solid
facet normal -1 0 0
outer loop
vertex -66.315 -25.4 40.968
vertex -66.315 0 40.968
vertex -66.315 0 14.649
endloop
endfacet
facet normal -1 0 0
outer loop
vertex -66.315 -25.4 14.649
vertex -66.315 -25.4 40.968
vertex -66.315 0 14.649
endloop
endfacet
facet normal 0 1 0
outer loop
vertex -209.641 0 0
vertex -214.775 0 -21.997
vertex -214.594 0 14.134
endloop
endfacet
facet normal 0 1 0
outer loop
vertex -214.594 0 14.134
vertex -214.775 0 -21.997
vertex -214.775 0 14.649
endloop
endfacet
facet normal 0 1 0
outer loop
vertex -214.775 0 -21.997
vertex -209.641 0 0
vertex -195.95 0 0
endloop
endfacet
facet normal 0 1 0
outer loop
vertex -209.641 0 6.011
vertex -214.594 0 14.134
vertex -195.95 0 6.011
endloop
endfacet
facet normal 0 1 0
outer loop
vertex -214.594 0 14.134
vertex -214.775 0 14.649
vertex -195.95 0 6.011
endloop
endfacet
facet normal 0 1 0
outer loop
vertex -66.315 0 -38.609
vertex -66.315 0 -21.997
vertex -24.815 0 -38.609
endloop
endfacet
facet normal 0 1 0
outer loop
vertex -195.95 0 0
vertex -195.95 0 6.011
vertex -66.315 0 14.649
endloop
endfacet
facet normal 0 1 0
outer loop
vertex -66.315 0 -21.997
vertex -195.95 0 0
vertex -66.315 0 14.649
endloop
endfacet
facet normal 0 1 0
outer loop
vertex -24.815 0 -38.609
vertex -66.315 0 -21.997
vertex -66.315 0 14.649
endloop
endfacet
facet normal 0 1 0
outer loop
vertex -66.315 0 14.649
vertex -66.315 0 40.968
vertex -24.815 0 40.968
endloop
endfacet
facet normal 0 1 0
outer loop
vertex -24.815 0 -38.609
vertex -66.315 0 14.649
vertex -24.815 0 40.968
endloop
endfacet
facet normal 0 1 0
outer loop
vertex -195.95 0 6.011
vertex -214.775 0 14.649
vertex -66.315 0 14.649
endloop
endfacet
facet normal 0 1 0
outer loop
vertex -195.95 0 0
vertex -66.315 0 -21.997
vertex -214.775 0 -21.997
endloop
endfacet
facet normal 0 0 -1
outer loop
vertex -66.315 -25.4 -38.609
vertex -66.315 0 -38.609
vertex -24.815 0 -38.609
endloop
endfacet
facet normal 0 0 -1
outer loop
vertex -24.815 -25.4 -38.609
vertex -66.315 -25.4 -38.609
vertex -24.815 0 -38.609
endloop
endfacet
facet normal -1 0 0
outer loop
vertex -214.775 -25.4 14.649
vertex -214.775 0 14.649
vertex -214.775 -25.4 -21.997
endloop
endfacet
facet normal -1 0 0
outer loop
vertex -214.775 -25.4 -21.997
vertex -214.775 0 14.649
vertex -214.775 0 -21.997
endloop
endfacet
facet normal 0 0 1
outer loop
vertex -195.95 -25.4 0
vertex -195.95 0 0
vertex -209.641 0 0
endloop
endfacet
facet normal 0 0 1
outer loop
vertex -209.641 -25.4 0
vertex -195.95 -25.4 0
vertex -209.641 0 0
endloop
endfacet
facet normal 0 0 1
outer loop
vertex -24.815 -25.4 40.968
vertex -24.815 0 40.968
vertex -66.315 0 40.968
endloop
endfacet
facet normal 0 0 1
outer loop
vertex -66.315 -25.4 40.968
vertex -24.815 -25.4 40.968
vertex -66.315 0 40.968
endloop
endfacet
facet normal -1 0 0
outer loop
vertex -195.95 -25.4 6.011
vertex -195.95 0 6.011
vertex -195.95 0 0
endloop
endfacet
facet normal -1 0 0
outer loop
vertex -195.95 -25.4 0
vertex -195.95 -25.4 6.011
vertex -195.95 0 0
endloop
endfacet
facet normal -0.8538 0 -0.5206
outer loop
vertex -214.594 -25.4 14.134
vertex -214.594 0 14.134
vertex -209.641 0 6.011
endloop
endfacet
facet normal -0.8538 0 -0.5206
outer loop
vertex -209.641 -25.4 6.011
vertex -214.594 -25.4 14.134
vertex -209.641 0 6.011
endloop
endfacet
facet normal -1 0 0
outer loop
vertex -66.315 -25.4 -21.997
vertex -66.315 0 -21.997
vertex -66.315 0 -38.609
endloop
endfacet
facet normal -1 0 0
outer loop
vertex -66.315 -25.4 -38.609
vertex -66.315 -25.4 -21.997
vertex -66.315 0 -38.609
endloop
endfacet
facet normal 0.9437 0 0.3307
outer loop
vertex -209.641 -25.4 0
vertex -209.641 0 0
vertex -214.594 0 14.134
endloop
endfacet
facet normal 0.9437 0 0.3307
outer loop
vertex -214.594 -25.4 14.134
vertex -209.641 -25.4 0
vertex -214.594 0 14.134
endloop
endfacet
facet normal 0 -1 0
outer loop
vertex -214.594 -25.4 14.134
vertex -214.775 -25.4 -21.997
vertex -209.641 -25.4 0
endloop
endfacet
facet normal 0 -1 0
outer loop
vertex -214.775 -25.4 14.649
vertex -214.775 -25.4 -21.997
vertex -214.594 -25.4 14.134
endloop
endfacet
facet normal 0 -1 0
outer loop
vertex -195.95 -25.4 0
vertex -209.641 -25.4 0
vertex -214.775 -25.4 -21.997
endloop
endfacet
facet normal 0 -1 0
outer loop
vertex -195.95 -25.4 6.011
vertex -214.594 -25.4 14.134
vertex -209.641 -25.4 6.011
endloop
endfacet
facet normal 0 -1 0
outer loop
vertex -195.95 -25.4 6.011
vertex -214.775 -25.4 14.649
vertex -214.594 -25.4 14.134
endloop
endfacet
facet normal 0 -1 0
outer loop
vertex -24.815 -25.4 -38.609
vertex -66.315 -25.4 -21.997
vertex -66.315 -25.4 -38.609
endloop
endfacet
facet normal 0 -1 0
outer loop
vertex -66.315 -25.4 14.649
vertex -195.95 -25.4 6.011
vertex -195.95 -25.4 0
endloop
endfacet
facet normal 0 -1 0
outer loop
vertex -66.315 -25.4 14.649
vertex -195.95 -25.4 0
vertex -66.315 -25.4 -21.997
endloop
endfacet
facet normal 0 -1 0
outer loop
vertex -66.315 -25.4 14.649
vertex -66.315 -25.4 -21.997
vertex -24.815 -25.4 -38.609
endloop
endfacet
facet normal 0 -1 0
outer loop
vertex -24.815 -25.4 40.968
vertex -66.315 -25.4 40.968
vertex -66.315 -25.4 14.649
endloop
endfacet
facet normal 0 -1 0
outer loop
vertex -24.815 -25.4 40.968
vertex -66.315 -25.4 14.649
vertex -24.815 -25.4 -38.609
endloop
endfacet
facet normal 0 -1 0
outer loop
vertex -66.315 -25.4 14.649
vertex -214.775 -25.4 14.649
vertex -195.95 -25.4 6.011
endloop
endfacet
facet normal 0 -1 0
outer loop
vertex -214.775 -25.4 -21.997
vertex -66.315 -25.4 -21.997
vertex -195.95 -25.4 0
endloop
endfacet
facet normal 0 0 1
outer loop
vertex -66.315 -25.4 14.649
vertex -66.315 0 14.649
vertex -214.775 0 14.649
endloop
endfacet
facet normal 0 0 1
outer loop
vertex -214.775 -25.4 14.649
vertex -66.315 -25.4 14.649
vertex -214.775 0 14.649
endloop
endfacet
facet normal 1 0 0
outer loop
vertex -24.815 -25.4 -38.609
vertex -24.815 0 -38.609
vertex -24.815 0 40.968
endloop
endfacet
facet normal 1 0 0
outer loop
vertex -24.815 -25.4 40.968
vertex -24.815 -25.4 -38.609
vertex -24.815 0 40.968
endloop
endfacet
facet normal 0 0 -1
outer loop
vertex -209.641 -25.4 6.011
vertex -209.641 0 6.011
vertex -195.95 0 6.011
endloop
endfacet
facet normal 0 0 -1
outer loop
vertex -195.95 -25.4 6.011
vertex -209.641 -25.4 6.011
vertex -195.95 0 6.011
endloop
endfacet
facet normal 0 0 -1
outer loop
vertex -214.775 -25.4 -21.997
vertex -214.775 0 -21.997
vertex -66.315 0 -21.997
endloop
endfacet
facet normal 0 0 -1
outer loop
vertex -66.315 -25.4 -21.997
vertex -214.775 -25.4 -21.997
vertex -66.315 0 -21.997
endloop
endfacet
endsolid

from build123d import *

# Parameters (mm, degrees)
F0_W     = 8.1289224327
F0_H     = 36.6465272382
F1_DEPTH = 25.4


with BuildPart() as f1:
    # F0 (on Front) → F1 (new body)
    with BuildSketch(Plane.XZ):
        Polygon((-24.8146168888, 40.9678071737), (-66.3149282336, 40.9678071737), (-66.3149282336, 14.6492579952), (-58.186005801, 14.6492579952), (-58.186005801, -21.997269243), (-66.3149282336, -21.997269243), (-66.3149282336, -38.6094748974), (-24.8146168888, -38.6094748974), align=None)
        with Locations((-62.2504670173, -3.6740056239)):
            Rectangle(F0_W, F0_H)
        Polygon((-66.3149282336, -21.997269243), (-66.3149282336, 14.6492579952), (-214.7748172283, 14.6492579952), (-214.5942430103, 14.1340185696), (-209.6407413483, 6.0107740574), (-195.9499269724, 6.0107740574), (-195.9499269724, 0), (-171.5631484985, -21.997269243), align=None)
        Polygon((-214.5942430103, 14.1340185696), (-214.7748172283, 14.6492579952), (-214.7748172283, 14.4301421254), align=None)
        Polygon((-214.7748172283, -21.997269243), (-171.5631484985, -21.997269243), (-195.9499269724, 0), (-209.6407413483, 0), (-214.5942430103, 14.1340185696), (-214.7748172283, 14.4301421254), align=None)
    extrude(amount=F1_DEPTH)


solid = f1.part
